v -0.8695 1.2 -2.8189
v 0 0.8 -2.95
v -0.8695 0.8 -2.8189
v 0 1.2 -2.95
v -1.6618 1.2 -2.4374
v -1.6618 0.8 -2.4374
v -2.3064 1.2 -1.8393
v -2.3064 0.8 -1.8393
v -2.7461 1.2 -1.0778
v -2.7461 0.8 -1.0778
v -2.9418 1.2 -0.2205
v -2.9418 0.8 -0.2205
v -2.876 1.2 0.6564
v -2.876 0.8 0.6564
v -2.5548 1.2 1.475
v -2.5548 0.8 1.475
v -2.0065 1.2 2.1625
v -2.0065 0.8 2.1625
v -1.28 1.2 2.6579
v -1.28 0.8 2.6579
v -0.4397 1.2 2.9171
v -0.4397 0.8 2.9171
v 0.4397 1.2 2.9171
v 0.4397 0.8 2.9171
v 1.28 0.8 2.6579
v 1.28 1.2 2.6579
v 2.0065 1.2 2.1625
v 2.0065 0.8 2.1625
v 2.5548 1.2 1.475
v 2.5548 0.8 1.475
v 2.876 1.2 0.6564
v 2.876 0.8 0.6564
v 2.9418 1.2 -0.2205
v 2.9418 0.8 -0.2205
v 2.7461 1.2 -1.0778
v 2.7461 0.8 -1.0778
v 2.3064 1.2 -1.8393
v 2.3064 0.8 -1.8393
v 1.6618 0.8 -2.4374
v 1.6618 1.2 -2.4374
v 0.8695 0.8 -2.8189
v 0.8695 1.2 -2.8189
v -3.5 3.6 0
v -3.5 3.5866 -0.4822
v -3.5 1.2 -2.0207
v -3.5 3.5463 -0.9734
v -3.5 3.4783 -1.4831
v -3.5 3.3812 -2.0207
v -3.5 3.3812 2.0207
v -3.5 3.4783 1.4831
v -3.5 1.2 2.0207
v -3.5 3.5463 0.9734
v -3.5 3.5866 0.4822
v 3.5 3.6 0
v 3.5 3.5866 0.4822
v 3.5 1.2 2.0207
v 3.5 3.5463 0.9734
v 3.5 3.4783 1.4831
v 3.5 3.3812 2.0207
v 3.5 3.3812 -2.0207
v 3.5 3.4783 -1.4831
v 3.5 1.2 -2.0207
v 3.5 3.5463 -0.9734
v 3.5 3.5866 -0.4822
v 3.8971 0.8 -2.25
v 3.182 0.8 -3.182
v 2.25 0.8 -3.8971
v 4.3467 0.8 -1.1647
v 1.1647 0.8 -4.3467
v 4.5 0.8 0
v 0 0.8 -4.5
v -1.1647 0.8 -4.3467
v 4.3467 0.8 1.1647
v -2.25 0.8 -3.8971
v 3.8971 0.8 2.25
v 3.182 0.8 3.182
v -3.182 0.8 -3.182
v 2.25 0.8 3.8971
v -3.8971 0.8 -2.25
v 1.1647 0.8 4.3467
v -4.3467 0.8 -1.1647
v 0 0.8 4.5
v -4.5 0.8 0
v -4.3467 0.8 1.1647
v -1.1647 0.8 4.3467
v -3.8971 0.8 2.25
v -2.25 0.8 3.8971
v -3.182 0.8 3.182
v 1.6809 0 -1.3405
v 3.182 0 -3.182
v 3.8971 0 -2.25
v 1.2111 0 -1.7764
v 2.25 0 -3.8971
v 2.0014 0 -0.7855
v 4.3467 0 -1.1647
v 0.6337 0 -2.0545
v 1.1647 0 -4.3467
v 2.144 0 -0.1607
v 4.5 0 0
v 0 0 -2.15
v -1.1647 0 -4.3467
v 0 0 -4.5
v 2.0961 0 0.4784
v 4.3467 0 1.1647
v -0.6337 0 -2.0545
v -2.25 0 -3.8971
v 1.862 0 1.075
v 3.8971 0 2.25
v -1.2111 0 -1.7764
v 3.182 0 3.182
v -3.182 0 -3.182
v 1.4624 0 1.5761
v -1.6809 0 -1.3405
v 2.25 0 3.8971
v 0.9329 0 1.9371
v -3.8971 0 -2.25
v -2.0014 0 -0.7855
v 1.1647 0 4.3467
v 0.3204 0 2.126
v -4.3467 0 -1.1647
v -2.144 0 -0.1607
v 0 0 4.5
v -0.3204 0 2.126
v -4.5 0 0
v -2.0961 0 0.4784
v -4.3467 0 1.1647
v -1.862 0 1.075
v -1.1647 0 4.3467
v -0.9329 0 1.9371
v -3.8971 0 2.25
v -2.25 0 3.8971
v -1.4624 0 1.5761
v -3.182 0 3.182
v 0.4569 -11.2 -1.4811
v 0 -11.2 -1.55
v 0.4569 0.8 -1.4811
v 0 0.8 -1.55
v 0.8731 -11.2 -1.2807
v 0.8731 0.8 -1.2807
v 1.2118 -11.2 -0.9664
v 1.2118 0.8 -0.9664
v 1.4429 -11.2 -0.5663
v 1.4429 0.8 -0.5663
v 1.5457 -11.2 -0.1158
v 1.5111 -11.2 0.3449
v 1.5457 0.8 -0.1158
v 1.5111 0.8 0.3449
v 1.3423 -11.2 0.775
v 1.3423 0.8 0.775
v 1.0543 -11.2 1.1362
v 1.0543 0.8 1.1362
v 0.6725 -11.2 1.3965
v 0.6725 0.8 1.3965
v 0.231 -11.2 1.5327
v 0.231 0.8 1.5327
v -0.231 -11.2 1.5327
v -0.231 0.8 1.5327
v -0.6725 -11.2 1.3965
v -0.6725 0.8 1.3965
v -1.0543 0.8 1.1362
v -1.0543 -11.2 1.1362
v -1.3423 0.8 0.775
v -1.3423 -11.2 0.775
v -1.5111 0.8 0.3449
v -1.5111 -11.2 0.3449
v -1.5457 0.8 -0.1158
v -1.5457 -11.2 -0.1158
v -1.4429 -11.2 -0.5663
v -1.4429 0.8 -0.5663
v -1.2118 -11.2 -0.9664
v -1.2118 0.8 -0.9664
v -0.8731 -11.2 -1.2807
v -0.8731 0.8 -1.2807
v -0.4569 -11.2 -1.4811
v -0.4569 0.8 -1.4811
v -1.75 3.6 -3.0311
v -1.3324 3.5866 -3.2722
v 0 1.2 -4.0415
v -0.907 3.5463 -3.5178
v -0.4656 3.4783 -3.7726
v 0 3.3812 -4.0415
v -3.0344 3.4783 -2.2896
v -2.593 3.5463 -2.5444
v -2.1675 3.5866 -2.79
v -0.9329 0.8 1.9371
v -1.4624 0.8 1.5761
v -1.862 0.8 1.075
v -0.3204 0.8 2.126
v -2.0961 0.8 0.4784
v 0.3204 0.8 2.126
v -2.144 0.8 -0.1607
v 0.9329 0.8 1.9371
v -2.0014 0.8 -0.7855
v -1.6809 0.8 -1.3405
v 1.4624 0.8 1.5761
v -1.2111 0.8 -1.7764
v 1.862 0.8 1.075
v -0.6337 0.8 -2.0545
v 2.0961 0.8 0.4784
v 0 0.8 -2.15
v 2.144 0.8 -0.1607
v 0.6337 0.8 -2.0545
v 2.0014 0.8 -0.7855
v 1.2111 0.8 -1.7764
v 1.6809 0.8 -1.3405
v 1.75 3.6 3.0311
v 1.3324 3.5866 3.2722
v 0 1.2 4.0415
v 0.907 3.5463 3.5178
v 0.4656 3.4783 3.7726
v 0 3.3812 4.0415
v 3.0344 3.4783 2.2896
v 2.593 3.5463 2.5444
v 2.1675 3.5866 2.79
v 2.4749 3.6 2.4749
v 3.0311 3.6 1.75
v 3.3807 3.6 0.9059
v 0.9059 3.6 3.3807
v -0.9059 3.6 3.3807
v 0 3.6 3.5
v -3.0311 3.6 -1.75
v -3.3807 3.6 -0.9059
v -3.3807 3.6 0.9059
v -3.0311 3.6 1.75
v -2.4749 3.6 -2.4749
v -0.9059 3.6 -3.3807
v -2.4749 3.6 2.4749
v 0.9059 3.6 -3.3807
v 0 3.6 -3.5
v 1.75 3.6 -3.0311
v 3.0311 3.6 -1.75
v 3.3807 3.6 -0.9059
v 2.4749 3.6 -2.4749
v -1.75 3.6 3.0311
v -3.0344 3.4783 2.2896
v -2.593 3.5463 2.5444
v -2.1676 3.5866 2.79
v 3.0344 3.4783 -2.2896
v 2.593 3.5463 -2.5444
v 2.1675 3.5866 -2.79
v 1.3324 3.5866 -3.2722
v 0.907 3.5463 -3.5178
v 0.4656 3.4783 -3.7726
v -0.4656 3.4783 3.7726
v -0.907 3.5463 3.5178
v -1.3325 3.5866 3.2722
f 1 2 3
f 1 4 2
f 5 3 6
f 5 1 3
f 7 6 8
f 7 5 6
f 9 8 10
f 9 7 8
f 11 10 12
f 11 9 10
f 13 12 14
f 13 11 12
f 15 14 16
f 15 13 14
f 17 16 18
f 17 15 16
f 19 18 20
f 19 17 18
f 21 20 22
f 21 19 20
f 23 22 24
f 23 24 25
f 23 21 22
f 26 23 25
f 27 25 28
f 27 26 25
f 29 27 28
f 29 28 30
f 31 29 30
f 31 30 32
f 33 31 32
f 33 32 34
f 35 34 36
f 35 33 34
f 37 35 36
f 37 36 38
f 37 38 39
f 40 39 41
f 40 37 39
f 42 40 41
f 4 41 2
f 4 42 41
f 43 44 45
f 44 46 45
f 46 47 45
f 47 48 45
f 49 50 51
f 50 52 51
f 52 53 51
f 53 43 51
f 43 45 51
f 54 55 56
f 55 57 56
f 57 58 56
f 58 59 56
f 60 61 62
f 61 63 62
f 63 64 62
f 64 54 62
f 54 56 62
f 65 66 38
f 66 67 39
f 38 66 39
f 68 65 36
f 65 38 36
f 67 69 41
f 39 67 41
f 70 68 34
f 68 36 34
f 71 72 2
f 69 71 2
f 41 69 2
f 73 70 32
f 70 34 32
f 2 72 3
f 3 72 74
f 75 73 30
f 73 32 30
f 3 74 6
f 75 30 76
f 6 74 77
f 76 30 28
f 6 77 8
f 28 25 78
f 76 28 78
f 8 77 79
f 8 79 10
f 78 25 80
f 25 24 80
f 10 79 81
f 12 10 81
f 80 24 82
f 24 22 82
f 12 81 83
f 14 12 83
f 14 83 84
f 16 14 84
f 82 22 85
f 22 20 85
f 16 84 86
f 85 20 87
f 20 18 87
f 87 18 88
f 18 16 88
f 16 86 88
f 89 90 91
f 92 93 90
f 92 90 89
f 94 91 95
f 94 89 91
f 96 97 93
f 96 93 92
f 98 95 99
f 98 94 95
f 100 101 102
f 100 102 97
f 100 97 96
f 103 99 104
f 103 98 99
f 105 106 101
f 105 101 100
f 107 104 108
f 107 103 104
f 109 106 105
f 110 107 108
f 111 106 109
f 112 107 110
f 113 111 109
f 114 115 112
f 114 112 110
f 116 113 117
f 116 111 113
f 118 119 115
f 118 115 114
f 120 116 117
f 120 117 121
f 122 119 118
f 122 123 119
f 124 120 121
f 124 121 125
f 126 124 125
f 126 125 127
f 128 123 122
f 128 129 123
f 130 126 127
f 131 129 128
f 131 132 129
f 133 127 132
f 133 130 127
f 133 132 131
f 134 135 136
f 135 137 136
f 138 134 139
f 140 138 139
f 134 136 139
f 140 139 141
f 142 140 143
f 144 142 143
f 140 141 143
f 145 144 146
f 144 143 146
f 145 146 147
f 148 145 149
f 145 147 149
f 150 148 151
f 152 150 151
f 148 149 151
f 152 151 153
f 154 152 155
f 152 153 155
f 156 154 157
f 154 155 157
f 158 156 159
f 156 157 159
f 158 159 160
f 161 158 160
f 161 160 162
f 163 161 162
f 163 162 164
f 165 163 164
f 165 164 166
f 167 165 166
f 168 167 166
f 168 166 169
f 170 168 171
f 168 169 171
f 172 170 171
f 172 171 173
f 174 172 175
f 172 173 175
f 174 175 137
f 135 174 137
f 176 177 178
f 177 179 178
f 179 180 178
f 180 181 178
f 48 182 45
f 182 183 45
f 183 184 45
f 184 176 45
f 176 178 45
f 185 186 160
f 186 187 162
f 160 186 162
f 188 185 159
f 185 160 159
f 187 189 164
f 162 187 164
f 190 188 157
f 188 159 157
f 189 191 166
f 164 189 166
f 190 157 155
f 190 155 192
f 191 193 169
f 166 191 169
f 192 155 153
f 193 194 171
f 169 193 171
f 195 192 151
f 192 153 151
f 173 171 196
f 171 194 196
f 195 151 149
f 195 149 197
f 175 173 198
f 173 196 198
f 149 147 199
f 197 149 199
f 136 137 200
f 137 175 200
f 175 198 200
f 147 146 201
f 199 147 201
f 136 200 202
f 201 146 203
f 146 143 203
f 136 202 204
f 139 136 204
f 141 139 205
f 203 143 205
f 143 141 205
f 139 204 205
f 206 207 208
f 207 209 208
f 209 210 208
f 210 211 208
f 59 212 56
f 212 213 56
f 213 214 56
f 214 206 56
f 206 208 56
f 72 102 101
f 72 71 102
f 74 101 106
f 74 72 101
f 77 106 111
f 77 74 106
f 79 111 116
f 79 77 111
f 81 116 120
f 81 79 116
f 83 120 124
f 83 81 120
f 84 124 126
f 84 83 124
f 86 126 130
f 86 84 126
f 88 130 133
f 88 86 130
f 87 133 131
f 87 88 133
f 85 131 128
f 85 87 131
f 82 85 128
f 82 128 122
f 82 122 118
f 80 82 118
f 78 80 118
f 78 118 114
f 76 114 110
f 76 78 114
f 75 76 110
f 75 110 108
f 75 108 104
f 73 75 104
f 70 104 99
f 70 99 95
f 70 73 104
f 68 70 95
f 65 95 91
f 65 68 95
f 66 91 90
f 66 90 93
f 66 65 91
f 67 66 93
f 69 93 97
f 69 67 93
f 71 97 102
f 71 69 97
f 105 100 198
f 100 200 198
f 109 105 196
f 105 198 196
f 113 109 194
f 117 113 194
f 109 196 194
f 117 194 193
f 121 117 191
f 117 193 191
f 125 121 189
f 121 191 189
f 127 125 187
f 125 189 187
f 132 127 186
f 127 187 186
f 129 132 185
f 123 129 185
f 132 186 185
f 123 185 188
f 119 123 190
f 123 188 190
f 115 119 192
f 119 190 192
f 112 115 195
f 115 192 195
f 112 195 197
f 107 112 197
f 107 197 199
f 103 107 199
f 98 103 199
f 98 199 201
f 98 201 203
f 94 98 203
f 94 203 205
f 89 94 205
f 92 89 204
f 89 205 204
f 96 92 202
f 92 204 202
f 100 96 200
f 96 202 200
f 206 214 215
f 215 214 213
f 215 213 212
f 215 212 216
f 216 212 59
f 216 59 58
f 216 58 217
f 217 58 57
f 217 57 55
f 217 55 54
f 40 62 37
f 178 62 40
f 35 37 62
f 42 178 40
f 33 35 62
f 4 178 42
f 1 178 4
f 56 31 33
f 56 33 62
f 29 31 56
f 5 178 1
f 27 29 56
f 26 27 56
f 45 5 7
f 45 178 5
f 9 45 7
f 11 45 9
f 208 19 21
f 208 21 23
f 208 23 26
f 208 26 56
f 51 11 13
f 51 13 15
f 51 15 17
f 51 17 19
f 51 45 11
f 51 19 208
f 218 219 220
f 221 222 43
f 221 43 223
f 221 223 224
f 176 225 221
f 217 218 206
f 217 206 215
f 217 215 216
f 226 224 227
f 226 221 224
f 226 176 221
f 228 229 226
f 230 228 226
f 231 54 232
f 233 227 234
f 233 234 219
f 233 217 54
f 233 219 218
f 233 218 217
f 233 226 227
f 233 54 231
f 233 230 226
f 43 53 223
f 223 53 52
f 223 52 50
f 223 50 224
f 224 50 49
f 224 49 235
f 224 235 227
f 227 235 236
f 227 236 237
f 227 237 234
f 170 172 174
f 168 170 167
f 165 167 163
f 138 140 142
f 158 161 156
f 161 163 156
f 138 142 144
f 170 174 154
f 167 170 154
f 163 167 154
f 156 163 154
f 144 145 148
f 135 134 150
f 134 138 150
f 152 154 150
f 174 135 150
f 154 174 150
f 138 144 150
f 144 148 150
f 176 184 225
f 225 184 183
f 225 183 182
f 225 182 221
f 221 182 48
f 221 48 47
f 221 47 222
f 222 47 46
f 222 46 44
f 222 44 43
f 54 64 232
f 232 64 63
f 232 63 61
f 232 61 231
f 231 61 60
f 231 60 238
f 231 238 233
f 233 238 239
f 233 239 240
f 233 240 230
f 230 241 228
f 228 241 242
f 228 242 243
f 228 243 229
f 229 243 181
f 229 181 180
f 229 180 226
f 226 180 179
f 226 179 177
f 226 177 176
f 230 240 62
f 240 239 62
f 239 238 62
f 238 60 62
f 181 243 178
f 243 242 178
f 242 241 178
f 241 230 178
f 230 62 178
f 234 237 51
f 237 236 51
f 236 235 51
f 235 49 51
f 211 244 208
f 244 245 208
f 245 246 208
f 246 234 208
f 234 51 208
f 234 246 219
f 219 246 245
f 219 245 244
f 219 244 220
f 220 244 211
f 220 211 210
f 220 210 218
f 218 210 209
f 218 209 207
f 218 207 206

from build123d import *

# Parameters (mm, degrees)
KOPF_DEPTH = 2.8
SKIZZE3_W  = 1.091451884
SKIZZE3_H  = 0.4
SKIZZE2_W  = 1.55
SKIZZE2_H  = 12
SKIZZE4_W  = 2.35
SKIZZE4_H  = 0.8


with BuildPart() as part:
    # Skizze1 → Kopf (new body)
    with BuildSketch(Plane(origin=(0, 0.8, 0), x_dir=(1, 0, 0), z_dir=(0, 1, 0))):
        Polygon((3.5, 2.020725942), (0, 4.041451884), (-3.5, 2.020725942), (-3.5, -2.020725942), (0, -4.041451884), (3.5, -2.020725942), align=None)
    extrude(amount=KOPF_DEPTH)

    # Skizze3 → Schnitt Kopf (revolve, cut)
    with BuildSketch(Plane(origin=(0, 0, 0), x_dir=(0, 0, -1), z_dir=(1, 0, 0))):
        Polygon((4.041451884, 3.6), (3.5, 3.6), (4.041451884, 3.381239239), align=None)
        with Locations((3.495725942, 1)):
            Rectangle(SKIZZE3_W, SKIZZE3_H)
    revolve(axis=Axis((0, 0, 0), (0, 1, 0)), mode=Mode.SUBTRACT)

    # Skizze2 → Gewinde (revolve)
    with BuildSketch(Plane.XY, mode=Mode.PRIVATE) as gewinde_sk:
        with Locations((0.775, -5.2)):
            Rectangle(SKIZZE2_W, SKIZZE2_H)
    revolve(gewinde_sk.sketch.rotate(Axis((0, 5.086887038, 0), (0, -1, 0)), 270), axis=Axis((0, 5.086887038, 0), (0, -1, 0)))  # turned: the seam where the file's is

    # Skizze4 → Rotation1 (revolve)
    with BuildSketch(Plane(origin=(0, 0, 0), x_dir=(0, 0, -1), z_dir=(1, 0, 0))):
        with Locations((3.325, 0.4)):
            Rectangle(SKIZZE4_W, SKIZZE4_H)
    revolve(axis=Axis((0, 0, 0), (0, 1, 0)))


solid = part.part
